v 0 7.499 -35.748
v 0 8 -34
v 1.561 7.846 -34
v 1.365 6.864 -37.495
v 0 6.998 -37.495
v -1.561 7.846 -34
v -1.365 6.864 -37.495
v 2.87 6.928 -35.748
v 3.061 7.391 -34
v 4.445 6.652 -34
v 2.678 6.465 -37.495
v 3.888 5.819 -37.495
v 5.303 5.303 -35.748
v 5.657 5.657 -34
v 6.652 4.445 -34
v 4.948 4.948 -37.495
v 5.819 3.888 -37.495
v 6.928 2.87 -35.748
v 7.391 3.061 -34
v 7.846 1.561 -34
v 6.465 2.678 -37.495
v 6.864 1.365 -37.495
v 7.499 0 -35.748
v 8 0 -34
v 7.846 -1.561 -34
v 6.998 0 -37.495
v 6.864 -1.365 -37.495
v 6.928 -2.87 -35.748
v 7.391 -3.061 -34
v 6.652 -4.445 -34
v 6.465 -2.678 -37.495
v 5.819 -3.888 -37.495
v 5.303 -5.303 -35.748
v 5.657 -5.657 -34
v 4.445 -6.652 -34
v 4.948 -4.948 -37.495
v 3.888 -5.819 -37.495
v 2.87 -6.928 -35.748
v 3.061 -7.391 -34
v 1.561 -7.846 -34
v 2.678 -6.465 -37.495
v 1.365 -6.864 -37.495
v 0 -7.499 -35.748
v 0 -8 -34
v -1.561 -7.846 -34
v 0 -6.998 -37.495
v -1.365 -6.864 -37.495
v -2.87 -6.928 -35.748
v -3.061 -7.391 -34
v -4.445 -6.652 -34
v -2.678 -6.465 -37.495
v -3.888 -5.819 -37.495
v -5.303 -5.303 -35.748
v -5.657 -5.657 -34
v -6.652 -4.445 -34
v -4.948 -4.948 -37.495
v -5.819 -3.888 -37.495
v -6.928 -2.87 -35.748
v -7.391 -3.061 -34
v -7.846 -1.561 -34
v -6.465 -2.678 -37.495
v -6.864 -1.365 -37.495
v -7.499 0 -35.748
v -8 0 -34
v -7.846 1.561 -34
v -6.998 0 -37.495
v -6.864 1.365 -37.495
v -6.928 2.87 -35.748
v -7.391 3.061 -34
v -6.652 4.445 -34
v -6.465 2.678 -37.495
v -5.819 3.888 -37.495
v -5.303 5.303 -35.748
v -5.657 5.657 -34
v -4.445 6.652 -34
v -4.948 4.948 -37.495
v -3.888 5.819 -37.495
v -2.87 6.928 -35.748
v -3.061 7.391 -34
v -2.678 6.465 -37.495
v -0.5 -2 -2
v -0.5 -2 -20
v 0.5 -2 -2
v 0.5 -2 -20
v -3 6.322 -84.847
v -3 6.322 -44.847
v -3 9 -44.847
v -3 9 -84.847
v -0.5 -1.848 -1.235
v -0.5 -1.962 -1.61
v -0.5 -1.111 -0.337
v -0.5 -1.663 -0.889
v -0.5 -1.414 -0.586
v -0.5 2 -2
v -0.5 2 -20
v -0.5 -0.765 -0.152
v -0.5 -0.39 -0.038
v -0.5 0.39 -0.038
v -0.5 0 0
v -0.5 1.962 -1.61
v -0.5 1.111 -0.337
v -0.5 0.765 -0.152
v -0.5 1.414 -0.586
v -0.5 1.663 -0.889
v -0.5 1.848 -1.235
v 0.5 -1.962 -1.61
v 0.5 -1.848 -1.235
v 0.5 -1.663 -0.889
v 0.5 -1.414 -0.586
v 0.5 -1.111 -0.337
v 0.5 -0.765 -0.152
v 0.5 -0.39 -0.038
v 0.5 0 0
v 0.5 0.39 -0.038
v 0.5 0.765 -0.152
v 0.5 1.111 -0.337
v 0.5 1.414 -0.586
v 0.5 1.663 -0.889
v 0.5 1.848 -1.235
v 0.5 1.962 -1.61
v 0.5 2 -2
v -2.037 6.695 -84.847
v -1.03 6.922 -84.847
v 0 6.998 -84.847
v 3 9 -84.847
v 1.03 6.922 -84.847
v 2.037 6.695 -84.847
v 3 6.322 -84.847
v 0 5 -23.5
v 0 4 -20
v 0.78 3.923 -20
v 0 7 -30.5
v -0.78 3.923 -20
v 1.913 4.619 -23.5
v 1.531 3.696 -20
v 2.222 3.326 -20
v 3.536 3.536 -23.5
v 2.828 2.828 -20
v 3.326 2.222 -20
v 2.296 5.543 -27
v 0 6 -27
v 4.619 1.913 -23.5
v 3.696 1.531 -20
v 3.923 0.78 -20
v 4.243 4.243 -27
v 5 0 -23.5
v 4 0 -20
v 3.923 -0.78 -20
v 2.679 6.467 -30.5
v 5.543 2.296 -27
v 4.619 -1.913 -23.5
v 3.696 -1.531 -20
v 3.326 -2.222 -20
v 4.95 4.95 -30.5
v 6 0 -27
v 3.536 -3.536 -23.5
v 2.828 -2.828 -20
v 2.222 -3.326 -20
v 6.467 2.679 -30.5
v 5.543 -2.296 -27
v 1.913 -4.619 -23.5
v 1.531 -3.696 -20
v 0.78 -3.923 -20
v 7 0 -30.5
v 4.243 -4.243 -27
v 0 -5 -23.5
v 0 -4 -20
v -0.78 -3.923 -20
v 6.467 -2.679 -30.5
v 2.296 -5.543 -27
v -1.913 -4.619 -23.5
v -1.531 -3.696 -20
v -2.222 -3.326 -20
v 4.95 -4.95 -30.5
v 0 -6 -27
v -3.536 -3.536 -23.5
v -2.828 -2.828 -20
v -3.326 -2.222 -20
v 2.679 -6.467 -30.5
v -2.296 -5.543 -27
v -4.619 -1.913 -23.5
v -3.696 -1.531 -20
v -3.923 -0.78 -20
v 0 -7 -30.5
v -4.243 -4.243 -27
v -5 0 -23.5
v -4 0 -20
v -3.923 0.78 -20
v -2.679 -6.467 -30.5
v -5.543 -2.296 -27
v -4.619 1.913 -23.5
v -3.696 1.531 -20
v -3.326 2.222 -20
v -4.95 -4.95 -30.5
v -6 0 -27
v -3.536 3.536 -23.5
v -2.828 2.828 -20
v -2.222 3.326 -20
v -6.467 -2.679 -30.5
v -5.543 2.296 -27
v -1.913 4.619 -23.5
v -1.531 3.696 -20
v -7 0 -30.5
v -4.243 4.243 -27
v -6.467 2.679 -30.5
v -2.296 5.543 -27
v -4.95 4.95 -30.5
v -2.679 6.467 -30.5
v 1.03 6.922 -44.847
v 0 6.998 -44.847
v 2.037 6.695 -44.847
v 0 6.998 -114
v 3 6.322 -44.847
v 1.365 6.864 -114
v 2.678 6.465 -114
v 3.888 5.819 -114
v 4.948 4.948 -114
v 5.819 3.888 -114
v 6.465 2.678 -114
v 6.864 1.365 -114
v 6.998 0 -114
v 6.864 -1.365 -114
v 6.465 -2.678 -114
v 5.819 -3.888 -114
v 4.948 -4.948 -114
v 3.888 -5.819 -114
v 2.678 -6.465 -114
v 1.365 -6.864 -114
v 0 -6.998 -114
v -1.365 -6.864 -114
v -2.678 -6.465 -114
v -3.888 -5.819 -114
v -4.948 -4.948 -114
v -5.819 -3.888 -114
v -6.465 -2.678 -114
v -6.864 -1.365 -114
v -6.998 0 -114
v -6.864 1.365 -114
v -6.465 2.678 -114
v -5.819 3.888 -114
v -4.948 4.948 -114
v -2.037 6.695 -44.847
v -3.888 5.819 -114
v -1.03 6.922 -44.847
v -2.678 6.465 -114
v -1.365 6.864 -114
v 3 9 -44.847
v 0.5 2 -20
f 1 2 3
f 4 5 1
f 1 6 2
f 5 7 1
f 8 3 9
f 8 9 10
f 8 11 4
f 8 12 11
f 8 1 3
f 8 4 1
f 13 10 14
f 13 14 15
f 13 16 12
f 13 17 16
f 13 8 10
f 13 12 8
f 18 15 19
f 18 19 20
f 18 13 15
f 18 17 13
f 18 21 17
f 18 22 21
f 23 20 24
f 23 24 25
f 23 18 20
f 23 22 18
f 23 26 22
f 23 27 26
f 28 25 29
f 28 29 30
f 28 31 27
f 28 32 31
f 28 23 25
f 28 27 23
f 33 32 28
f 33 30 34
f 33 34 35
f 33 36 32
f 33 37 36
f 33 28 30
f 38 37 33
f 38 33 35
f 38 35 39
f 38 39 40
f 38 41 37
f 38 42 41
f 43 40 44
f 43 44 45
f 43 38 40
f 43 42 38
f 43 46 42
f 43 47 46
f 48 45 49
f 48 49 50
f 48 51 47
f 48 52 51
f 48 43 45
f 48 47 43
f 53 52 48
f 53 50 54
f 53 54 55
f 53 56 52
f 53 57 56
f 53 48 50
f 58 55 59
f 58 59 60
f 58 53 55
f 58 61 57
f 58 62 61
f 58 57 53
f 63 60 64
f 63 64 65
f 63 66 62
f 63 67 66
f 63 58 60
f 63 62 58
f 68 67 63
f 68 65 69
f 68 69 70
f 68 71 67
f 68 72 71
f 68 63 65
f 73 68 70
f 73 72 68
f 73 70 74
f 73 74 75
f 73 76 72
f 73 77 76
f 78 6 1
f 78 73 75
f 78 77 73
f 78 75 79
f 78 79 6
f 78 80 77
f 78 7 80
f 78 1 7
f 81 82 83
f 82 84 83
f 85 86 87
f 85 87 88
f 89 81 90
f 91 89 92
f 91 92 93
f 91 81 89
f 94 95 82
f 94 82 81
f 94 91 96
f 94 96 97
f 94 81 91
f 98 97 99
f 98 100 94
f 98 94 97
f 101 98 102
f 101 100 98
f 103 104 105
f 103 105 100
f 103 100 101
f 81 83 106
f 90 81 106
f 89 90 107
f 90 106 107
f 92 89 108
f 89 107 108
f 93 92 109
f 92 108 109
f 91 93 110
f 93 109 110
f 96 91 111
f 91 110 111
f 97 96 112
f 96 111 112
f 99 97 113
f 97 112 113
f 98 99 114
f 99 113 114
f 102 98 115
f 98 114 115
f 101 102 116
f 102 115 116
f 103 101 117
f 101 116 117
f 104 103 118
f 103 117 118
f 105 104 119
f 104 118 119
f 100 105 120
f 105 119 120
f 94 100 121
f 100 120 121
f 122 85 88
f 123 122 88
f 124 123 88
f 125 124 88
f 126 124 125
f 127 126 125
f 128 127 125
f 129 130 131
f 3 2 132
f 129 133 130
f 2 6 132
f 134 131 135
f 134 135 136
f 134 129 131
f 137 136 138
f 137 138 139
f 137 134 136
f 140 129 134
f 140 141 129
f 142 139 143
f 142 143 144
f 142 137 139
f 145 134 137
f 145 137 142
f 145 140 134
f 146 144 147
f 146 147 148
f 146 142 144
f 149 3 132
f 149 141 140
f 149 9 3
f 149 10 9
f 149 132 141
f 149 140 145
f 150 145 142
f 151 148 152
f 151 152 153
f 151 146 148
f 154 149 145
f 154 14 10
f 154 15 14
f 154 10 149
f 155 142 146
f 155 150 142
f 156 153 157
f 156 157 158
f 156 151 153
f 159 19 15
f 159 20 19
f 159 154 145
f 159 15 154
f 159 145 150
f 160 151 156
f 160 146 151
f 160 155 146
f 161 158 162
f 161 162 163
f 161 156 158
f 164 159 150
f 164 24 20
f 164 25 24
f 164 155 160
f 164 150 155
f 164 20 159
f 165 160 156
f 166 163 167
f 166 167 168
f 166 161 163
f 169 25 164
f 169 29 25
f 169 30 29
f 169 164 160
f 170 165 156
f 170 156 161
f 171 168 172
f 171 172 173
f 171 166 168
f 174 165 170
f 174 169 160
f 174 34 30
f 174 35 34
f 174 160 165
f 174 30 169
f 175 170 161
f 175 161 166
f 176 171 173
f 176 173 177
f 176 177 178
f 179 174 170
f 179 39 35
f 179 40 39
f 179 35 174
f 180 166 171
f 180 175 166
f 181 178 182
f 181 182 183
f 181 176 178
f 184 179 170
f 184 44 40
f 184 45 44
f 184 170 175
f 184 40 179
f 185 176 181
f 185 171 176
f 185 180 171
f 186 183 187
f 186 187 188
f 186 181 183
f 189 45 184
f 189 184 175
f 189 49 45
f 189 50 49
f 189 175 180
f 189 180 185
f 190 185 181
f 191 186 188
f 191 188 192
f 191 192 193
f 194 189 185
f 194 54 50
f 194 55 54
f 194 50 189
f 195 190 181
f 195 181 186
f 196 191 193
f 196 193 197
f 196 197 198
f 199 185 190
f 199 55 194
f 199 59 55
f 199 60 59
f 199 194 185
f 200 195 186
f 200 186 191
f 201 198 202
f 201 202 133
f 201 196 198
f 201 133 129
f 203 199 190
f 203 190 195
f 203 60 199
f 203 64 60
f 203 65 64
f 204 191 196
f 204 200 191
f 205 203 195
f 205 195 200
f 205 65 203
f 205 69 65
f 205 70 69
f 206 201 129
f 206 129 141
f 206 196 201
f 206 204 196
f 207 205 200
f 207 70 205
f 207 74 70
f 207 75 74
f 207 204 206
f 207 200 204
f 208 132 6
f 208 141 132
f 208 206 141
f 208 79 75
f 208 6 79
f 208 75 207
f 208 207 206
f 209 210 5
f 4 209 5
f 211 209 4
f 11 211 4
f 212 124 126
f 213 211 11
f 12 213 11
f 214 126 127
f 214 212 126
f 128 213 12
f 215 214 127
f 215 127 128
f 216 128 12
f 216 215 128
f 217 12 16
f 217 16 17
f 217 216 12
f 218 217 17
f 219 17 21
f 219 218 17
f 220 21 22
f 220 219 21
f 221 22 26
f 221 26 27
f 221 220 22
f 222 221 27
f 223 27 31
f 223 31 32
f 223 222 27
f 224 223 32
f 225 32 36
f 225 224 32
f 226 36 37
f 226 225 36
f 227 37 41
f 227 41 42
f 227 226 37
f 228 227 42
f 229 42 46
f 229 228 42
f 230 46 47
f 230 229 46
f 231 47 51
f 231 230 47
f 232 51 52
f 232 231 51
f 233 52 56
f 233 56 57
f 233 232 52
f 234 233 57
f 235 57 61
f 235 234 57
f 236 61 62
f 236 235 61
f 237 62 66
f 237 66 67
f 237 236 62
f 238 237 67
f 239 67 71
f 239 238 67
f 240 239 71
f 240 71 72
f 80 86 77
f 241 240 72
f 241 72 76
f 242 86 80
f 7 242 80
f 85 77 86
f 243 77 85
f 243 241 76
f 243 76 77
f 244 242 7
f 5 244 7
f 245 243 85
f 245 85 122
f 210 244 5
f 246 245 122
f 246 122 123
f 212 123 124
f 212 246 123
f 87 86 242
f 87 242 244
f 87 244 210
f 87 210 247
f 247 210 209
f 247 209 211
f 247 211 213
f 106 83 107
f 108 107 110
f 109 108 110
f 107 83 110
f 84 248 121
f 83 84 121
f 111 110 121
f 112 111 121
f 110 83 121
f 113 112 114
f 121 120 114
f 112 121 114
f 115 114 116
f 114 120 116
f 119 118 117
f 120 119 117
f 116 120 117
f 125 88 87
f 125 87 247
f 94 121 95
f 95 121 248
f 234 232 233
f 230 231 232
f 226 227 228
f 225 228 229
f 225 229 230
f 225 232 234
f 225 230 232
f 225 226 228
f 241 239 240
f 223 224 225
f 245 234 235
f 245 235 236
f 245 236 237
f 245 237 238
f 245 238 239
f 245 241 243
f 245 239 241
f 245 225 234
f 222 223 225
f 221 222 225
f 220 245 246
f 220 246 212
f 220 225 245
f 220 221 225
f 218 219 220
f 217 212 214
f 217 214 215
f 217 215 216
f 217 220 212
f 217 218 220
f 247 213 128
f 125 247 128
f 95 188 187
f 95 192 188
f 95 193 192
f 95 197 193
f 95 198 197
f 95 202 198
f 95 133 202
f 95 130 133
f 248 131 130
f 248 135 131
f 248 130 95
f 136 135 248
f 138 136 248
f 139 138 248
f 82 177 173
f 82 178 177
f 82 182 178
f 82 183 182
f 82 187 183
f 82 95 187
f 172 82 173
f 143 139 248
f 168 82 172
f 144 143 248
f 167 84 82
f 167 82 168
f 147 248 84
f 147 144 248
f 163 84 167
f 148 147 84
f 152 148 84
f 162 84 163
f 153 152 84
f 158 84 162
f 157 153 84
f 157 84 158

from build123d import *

# Parameters (mm, degrees)
BOSS_EXTRUDE1_DEPTH = 0.5
SKETCH3_W           = 6
SKETCH3_H           = 40
BOSS_EXTRUDE2_DEPTH = 9


with BuildPart() as part:
    # Sketch1 → Boss-Extrude1 (new body, symmetric)
    with BuildSketch(Plane(origin=(0, 0, 0), x_dir=(0, 0, -1), z_dir=(1, 0, 0))):
        with BuildLine():
            Line((2, 2), (20, 2))
            Line((20, 2), (20, -2))
            Line((20, -2), (2, -2))
            ThreePointArc((2, -2), (0, 0), (2, 2))
        make_face()
    extrude(amount=BOSS_EXTRUDE1_DEPTH, both=True)

    # Sketch2 → Revolve1 (revolve)
    with BuildSketch(Plane(origin=(0, 0, 0), x_dir=(0, 0, -1), z_dir=(1, 0, 0))):
        Polygon((20, 0), (20, 4), (34, 8), (37.495076137, 6.998076938), (114, 6.998076938), (114, 0), (34, 0), align=None)
    revolve(axis=Axis((0, 0, -20), (0, 0, -1)))

    # Sketch3 → Boss-Extrude2 (add)
    with BuildSketch(Plane(origin=(0, 0, 0), x_dir=(1, 0, 0), z_dir=(0, 1, 0))):
        with Locations((0, 64.847291261)):
            Rectangle(SKETCH3_W, SKETCH3_H)
    extrude(amount=BOSS_EXTRUDE2_DEPTH)


solid = part.part
